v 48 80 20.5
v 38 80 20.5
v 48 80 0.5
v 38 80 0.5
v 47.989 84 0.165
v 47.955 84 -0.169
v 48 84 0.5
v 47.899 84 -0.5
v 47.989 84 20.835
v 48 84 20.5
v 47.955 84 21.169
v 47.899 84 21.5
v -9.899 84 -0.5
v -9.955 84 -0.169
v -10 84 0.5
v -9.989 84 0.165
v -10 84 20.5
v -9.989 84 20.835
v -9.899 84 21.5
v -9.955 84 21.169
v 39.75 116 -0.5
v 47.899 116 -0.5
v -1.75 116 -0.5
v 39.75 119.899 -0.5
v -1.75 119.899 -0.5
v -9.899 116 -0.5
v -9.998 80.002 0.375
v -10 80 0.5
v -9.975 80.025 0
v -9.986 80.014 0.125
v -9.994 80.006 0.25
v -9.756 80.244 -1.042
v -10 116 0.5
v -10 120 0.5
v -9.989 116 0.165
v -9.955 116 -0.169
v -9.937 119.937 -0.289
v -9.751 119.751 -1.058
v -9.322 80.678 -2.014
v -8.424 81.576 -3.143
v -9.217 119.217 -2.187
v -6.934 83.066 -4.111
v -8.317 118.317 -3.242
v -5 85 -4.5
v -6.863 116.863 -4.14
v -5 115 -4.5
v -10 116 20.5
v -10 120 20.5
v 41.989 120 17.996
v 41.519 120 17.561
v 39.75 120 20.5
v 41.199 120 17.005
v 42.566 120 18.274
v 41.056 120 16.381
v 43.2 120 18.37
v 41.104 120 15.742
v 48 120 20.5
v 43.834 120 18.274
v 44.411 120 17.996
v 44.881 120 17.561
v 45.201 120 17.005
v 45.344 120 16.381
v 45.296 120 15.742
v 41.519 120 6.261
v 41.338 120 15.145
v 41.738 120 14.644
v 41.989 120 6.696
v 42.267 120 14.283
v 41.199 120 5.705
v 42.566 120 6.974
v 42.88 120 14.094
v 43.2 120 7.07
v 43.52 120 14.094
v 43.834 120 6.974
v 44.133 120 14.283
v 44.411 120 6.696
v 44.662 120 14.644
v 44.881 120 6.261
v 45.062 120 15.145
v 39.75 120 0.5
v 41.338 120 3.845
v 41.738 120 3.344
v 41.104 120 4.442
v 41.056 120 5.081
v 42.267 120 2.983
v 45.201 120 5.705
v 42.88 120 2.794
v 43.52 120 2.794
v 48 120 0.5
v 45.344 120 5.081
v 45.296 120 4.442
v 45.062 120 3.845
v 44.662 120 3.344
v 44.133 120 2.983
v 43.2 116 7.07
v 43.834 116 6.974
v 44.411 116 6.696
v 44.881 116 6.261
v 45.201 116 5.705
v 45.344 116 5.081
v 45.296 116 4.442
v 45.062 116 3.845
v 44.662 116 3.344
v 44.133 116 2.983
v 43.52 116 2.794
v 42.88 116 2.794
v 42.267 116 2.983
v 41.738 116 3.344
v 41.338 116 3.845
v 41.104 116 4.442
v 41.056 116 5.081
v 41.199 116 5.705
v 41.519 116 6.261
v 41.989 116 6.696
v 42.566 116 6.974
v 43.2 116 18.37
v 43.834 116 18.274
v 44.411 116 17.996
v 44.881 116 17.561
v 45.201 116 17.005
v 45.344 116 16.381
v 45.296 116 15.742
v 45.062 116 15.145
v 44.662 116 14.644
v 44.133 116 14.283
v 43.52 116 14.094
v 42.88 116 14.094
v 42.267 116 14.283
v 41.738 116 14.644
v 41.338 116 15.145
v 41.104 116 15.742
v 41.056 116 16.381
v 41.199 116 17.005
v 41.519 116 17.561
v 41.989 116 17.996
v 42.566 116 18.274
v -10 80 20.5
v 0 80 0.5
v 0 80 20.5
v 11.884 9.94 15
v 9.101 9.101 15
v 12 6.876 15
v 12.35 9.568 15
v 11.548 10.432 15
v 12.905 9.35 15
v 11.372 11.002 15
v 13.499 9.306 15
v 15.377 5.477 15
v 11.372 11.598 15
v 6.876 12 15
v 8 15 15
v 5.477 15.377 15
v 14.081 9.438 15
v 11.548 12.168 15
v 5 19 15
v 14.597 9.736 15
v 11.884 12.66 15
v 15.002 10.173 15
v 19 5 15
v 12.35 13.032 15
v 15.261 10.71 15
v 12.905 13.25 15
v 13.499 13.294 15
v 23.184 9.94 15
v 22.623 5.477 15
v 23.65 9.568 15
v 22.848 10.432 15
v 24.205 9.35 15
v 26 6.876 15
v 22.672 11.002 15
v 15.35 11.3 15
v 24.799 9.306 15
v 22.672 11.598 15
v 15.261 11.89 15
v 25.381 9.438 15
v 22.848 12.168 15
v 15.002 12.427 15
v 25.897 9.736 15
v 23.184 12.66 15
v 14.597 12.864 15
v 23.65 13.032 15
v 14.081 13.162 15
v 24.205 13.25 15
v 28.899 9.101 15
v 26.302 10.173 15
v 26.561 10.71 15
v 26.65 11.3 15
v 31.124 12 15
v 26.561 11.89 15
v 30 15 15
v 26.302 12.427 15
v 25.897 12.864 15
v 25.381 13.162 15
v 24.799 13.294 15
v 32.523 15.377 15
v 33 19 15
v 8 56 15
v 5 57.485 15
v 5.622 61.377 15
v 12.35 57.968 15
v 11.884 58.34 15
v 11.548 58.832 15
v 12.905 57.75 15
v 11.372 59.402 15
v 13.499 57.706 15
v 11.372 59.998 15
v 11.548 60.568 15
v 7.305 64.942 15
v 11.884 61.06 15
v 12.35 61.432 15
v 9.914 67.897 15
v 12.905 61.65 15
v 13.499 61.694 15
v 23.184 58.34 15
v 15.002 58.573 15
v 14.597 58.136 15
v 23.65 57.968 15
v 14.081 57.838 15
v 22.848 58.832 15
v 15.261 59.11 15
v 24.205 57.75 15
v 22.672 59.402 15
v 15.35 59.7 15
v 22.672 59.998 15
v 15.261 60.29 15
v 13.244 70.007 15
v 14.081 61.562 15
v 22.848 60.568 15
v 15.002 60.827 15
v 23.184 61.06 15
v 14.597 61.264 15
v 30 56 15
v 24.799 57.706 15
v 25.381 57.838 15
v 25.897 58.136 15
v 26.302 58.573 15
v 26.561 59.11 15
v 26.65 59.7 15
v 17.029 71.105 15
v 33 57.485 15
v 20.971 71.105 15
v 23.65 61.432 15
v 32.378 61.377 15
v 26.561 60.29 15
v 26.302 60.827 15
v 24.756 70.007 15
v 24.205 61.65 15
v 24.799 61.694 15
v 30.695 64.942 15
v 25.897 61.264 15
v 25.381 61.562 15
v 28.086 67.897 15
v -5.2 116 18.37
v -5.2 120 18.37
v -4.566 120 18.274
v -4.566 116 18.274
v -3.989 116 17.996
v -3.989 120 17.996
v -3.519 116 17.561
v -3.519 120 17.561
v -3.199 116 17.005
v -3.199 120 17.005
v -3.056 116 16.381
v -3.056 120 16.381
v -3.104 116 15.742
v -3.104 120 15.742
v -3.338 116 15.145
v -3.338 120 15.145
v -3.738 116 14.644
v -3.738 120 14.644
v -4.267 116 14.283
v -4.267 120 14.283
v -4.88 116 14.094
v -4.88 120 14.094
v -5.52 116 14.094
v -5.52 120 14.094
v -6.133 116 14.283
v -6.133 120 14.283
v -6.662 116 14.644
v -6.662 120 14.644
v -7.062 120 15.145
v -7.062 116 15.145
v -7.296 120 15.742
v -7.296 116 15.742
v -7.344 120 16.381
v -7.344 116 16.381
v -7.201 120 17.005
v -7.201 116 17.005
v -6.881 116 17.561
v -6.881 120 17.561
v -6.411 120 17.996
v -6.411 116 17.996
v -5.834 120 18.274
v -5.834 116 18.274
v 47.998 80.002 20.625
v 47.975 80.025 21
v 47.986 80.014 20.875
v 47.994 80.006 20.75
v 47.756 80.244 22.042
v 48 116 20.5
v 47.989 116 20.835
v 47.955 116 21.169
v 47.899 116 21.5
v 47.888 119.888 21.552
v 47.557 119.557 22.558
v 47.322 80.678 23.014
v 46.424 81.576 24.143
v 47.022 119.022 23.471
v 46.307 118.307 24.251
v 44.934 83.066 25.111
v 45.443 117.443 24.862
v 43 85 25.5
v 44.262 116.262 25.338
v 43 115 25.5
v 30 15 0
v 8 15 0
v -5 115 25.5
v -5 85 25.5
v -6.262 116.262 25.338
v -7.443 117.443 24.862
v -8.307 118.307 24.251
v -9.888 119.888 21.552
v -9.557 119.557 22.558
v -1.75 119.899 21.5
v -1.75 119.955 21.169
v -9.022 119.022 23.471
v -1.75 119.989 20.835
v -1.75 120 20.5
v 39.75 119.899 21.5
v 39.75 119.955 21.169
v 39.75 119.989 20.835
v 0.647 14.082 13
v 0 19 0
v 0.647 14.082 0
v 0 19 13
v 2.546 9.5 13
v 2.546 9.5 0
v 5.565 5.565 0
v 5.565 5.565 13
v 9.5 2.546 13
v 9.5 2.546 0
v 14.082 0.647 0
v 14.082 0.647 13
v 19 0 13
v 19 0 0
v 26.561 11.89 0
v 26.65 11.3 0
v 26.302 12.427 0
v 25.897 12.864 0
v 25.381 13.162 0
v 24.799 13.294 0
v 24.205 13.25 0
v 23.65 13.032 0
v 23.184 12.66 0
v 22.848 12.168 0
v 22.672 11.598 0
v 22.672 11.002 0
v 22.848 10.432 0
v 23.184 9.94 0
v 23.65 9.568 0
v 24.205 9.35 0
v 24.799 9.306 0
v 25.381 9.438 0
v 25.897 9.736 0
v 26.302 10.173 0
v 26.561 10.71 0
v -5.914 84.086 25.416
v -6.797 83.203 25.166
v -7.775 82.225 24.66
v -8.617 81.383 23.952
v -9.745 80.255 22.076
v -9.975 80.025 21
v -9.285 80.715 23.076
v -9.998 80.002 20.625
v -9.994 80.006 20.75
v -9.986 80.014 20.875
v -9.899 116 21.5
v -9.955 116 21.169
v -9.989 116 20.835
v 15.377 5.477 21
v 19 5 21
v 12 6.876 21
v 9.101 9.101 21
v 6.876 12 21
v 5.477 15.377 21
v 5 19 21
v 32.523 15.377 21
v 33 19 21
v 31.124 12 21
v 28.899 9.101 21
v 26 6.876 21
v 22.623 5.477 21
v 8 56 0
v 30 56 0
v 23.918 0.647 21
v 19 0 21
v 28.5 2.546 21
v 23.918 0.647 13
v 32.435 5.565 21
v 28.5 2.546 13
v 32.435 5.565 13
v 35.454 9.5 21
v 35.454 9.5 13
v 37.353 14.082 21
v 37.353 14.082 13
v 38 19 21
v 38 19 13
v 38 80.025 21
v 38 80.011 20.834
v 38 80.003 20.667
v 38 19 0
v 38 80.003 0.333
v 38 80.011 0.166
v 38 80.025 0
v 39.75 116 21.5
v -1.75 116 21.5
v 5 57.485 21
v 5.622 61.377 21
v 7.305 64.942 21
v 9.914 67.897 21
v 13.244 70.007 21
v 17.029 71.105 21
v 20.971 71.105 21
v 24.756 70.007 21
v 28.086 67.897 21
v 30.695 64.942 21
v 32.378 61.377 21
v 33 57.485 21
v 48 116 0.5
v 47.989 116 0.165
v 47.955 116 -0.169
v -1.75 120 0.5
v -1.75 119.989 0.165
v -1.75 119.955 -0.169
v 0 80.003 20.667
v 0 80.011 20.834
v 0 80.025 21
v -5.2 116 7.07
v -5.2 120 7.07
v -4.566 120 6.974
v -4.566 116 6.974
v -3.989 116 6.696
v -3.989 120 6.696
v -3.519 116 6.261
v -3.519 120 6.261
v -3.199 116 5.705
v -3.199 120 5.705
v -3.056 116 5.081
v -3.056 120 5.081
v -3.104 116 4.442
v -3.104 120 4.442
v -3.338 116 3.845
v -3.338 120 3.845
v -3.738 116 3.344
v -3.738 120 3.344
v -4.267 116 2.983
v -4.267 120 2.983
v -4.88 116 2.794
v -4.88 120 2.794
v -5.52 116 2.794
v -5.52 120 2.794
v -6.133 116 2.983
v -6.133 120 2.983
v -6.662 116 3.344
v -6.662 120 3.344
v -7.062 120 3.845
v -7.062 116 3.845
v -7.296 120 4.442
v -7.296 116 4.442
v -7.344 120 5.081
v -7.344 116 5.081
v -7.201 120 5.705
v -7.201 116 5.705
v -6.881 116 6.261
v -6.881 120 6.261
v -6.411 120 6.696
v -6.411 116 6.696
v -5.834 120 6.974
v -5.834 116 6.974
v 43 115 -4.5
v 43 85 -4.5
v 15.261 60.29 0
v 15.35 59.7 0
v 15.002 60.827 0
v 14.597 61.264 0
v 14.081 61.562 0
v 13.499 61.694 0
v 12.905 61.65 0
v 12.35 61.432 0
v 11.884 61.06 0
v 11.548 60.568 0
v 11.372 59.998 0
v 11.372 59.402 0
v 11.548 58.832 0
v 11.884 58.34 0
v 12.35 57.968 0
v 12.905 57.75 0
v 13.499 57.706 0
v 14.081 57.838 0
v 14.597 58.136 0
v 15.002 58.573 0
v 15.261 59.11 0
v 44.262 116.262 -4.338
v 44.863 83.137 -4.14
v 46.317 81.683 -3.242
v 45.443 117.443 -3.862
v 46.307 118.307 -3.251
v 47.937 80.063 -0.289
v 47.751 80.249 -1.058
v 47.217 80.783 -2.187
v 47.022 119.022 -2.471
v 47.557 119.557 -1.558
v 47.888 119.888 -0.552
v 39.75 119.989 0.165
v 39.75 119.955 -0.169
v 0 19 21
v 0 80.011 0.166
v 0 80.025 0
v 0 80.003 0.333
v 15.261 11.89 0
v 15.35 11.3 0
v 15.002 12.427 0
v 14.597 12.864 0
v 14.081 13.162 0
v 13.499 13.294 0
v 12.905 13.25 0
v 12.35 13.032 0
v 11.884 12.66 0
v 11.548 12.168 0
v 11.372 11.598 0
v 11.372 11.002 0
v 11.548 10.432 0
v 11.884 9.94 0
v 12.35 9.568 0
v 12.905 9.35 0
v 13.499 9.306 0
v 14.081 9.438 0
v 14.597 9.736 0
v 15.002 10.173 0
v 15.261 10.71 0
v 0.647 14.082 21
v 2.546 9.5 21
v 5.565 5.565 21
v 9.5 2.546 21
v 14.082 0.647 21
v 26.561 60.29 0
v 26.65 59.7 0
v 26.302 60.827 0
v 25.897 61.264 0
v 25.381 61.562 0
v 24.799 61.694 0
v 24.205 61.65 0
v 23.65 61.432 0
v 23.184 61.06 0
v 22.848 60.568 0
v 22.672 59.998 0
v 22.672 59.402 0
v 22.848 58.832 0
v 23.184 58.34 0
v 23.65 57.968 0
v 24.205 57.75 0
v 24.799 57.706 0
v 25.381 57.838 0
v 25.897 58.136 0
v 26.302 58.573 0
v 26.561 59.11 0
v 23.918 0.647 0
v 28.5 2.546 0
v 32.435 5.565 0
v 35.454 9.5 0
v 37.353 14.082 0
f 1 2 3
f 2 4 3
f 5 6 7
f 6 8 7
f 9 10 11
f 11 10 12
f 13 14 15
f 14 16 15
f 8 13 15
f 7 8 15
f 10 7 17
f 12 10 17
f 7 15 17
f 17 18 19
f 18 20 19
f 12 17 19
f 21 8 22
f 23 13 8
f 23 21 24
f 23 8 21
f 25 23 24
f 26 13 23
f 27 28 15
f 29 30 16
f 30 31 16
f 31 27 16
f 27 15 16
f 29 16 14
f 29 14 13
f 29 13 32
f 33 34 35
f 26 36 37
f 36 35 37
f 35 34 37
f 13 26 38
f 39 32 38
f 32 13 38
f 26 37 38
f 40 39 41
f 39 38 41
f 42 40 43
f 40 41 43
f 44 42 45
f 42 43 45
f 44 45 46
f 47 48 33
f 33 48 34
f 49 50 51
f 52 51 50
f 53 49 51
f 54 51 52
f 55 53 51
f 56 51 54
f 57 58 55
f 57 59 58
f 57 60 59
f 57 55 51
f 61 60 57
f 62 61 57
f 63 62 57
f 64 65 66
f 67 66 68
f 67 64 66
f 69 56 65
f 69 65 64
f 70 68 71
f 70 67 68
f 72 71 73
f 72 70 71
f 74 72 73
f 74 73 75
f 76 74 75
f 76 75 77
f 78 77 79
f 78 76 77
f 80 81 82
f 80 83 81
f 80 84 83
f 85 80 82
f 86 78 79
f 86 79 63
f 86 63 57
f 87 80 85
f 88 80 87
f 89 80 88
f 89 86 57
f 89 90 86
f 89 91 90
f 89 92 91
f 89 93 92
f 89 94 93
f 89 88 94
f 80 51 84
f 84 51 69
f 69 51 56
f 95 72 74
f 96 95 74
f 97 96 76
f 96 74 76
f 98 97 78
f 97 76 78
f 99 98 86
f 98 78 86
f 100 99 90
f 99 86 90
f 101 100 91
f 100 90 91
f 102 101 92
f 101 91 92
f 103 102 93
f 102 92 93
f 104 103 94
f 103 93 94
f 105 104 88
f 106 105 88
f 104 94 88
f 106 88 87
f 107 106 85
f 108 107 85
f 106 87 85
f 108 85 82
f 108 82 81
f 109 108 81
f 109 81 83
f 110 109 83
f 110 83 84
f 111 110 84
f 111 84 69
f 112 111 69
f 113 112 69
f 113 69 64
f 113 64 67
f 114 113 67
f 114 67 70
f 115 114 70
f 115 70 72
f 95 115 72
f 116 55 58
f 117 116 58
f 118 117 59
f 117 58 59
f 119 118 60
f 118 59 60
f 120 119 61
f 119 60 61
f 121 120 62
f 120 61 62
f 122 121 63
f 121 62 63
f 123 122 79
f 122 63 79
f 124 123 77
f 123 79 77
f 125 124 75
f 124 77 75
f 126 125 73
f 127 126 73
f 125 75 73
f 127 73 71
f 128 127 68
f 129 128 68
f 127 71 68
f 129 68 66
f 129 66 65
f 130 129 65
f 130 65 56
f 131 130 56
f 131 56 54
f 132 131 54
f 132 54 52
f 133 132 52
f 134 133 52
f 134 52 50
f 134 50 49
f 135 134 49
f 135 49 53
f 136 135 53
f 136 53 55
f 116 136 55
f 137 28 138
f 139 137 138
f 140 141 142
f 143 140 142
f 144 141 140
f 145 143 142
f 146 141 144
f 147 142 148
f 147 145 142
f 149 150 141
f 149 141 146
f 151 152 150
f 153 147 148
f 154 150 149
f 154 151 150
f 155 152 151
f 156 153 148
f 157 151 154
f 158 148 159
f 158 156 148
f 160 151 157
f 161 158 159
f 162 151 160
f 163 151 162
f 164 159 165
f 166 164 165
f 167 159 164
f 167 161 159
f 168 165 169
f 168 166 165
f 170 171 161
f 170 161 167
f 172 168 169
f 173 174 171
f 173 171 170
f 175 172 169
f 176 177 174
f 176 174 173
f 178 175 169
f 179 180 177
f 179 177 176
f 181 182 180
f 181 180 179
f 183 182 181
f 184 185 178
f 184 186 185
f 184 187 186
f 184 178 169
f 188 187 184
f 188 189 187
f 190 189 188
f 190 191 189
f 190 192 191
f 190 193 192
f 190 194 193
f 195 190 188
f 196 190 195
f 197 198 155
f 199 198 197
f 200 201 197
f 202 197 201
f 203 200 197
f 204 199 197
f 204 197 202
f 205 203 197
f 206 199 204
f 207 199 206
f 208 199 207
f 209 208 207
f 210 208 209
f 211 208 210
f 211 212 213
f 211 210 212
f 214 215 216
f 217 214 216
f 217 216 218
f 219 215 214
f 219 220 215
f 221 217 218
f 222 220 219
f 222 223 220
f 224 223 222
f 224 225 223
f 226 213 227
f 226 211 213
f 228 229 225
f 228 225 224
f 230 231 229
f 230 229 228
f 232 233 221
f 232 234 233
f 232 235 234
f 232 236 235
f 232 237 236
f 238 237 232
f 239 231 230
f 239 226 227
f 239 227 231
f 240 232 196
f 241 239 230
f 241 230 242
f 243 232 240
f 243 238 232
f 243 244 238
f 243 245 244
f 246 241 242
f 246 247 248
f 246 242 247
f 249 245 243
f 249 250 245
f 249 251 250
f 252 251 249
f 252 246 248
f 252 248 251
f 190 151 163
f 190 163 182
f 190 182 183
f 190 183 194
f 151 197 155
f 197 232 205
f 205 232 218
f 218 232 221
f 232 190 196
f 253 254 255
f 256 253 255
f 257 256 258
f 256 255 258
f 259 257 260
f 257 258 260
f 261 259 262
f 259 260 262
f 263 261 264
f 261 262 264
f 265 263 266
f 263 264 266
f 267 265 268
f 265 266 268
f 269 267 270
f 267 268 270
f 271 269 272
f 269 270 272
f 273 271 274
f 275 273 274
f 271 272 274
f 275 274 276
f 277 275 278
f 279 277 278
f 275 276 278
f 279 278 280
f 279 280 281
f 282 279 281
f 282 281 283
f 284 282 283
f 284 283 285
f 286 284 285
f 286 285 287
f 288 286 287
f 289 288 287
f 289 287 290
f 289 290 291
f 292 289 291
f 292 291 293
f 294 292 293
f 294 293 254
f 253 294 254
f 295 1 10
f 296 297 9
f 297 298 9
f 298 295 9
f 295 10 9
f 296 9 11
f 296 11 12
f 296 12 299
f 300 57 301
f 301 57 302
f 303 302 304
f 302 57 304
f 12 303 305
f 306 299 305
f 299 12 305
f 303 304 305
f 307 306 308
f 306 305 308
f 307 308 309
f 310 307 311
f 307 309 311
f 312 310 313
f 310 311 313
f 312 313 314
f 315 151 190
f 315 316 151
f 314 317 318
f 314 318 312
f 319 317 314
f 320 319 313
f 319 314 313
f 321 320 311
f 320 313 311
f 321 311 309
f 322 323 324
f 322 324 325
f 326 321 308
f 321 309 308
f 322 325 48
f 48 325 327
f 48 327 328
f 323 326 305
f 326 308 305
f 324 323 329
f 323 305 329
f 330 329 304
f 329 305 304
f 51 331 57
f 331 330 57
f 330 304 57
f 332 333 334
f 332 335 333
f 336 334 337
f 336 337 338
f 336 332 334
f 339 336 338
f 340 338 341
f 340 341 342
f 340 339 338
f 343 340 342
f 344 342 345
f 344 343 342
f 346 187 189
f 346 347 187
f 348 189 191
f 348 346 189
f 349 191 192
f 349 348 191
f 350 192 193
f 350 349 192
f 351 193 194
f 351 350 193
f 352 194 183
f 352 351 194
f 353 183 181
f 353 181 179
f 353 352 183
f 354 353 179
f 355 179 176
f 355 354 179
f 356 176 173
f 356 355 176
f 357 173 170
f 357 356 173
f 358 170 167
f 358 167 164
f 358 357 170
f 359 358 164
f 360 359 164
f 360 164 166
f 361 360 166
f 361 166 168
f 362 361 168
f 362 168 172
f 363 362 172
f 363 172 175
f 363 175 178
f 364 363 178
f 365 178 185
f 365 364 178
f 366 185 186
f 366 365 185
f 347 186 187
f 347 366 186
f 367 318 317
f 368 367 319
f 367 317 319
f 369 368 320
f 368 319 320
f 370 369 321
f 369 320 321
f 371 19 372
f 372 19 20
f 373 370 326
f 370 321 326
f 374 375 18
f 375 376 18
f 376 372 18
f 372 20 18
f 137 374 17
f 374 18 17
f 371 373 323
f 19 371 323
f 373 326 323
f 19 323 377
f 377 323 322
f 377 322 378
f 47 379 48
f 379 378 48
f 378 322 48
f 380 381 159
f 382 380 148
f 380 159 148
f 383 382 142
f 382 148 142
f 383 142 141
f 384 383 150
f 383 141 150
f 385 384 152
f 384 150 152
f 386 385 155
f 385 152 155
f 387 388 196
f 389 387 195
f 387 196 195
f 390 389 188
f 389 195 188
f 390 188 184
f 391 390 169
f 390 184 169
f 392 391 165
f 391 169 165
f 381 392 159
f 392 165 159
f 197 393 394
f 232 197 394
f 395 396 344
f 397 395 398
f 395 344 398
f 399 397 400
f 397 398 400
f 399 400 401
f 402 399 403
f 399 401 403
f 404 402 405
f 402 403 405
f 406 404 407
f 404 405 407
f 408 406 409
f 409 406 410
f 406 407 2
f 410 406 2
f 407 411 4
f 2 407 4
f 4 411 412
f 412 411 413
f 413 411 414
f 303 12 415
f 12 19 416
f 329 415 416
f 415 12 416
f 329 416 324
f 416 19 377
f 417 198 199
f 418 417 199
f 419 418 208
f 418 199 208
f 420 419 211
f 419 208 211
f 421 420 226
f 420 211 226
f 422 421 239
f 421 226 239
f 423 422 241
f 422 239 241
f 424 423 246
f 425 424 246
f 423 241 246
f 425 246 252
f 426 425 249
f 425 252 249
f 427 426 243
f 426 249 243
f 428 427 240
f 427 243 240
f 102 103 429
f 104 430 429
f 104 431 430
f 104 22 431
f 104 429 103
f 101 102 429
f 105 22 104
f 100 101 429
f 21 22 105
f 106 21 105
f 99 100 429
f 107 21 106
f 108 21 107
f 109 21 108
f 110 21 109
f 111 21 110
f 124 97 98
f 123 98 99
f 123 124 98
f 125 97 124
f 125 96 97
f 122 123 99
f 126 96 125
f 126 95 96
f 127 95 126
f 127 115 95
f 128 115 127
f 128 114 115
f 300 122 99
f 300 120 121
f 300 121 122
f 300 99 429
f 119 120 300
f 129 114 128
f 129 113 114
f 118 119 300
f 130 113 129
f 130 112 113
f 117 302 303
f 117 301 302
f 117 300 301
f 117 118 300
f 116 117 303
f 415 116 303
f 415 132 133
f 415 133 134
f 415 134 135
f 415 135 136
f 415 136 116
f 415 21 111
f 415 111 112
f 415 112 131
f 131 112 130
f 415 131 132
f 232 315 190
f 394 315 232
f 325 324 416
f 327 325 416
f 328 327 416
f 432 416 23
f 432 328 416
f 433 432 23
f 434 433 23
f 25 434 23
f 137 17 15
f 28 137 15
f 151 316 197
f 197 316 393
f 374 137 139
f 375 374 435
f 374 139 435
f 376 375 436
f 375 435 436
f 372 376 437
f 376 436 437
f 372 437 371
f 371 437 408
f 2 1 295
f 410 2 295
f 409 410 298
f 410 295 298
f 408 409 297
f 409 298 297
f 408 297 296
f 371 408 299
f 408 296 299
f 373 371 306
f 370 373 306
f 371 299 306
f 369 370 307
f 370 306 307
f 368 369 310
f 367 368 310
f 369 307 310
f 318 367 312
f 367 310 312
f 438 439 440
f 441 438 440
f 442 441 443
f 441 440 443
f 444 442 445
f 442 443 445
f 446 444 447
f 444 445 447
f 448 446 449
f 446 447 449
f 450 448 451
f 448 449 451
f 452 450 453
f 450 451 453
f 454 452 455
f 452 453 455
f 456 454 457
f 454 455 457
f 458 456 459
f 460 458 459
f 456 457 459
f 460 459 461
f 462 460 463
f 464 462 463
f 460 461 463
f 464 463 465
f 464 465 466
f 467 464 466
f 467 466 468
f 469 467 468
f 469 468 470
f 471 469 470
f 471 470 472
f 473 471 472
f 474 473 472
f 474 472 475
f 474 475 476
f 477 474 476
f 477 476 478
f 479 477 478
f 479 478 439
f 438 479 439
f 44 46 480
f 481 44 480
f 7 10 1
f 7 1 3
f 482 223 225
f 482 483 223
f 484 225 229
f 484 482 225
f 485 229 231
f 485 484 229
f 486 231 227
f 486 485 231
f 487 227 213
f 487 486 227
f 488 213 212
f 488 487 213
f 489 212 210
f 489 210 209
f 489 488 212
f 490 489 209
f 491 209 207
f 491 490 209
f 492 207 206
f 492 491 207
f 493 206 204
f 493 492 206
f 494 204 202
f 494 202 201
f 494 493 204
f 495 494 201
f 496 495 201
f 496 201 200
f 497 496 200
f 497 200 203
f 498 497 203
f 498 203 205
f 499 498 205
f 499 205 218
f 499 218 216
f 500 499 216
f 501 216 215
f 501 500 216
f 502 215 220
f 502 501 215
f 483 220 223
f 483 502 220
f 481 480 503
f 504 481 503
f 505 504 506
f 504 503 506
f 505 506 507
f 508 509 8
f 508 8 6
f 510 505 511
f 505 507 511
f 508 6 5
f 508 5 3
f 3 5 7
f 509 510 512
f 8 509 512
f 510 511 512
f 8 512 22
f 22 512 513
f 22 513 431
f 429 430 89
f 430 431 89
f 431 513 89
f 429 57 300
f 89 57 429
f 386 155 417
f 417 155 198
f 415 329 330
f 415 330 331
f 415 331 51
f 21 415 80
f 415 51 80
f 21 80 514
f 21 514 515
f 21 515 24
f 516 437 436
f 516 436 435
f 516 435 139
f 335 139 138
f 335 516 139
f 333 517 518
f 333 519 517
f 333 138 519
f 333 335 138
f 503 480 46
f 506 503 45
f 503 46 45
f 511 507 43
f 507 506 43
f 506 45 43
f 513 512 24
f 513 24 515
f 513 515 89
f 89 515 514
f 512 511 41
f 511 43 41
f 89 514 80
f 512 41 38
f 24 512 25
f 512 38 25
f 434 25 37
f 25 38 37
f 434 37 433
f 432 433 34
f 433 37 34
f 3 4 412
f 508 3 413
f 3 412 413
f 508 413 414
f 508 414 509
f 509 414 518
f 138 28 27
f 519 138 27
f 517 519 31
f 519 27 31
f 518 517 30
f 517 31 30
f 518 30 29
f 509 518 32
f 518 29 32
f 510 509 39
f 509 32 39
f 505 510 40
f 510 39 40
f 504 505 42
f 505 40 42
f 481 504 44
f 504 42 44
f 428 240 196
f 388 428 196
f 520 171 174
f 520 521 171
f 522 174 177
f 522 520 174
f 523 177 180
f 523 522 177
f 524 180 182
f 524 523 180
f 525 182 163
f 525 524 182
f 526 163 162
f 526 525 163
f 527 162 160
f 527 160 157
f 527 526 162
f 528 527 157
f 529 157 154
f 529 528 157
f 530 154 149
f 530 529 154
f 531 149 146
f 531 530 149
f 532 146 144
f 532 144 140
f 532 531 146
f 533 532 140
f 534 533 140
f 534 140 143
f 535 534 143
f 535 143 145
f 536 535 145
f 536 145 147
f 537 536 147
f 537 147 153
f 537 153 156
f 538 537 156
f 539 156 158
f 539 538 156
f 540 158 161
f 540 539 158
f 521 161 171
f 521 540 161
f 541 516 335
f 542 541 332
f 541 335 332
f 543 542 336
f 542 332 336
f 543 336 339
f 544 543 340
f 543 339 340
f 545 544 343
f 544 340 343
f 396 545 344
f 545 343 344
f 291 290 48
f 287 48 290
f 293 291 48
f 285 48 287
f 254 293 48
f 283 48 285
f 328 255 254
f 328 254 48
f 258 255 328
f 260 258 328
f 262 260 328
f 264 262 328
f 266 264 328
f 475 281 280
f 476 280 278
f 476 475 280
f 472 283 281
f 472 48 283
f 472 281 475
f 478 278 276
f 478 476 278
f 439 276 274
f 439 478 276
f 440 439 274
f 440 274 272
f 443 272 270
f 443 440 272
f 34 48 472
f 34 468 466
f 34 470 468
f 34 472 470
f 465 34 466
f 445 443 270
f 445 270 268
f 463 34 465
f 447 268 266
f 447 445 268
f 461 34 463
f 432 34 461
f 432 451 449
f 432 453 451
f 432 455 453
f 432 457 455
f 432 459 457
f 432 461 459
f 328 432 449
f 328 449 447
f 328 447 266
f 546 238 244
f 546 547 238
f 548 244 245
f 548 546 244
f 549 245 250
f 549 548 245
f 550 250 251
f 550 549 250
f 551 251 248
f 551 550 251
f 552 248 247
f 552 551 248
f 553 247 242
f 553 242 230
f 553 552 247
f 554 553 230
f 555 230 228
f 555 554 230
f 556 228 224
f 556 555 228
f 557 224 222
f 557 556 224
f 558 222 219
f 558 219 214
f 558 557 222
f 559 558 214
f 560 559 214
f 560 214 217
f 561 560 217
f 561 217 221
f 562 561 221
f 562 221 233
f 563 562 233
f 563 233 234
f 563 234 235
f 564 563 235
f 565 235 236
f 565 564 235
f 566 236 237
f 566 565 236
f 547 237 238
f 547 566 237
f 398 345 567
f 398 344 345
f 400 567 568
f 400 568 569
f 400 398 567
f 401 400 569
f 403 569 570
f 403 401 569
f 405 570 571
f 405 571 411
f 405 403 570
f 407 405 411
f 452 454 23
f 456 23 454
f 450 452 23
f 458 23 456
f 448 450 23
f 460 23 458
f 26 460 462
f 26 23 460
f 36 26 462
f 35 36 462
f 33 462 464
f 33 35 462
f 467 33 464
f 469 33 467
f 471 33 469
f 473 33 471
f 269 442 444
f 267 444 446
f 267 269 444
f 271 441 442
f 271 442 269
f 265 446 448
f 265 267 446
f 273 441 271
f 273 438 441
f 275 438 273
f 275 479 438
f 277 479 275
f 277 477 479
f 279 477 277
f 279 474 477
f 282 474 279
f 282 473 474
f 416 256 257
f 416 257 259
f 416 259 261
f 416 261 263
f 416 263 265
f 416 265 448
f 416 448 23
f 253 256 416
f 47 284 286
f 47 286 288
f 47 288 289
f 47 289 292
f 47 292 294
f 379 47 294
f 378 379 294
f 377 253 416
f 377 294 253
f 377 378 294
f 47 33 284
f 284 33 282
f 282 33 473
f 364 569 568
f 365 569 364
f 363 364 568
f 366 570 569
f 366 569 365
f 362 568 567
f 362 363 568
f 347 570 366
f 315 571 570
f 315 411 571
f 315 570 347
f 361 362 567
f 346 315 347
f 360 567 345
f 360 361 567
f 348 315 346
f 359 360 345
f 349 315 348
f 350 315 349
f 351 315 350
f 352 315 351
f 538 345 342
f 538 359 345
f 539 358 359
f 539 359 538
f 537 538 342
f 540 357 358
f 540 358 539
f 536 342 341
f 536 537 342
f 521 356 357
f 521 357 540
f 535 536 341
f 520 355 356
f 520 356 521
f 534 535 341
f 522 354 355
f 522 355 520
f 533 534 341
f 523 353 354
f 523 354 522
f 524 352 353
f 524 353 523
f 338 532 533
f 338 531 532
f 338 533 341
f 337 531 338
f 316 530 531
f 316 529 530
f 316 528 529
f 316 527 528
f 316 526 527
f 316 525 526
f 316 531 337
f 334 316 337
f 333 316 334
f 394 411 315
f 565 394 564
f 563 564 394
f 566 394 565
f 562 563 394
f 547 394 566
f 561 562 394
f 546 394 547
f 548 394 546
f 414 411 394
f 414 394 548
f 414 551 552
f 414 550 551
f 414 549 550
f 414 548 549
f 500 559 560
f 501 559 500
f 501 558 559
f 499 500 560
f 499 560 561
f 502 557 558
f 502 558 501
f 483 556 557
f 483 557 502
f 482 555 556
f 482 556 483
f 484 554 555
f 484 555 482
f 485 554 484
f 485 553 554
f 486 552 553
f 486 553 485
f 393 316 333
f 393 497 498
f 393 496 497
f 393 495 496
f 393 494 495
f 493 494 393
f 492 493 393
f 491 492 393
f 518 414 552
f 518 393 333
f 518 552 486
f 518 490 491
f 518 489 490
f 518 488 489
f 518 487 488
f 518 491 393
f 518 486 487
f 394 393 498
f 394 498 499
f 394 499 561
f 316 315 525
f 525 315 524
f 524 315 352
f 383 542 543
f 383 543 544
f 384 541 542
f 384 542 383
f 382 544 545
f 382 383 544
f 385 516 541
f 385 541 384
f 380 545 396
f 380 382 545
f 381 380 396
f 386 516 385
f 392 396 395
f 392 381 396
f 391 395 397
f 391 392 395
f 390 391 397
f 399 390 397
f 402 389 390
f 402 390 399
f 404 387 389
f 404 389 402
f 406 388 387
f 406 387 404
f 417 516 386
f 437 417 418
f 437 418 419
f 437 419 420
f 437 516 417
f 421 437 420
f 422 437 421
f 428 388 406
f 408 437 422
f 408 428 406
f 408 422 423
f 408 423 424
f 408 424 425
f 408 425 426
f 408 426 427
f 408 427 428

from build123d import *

# Parameters (mm, degrees)
SKETCH1_W                = 38
SKETCH1_H                = 120
BOSS_EXTRUDE1_DEPTH      = 13
FILLET1_R                = 19
SKETCH2_W                = 28
SKETCH2_H                = 43
BOSS_EXTRUDE2_DEPTH      = 8
SKETCH4_W                = 58
SKETCH4_H                = 30
BOSS_EXTRUDE3_DEPTH      = 40
SKETCH4_2_W              = 41.5
SKETCH4_2_H              = 22
SKETCH4_2_W_2            = 38
SKETCH4_2_H_2            = 21
CUT_EXTRUDE2_DEPTH       = 35
CUT_EXTRUDE3_REACH       = 137.699
SKETCH5_W                = 22
SKETCH5_H                = 32
CUT_EXTRUDE4_REACH       = 133.736
SKETCH7_R                = 2.15
FILLET2_R                = 5
CUT_EXTRUDE5_START       = -8
CUT_EXTRUDE5_DEPTH       = 8
BOSS_EXTRUDE4_DEPTH      = 8
SKETCH9_W                = 22
SKETCH9_H                = 41
CUT_EXTRUDE20_DEPTH      = 131.859657649
CUT_EXTRUDE22_DEPTH      = 131.859657649
CUT_EXTRUDE22_DEPTH_BACK = 131.859657649
SKETCH11_R               = 2
SKETCH11_W               = 22
SKETCH11_H               = 41
SKETCH12_R               = 2
SKETCH12_W               = 22
SKETCH12_H               = 41
BOSS_EXTRUDE6_DEPTH      = 10


# Some blends are built 0.0001 mm under size
with BuildPart() as part:
    # Sketch1 → Boss-Extrude1 (new body)
    with BuildSketch(Plane.XY):
        with Locations((19, 60)):
            Rectangle(SKETCH1_W, SKETCH1_H)
    extrude(amount=BOSS_EXTRUDE1_DEPTH)

    # Fillet1
    fillet1_edges = [part.edges().sort_by_distance(p)[0] for p in [
        (38, 0, 6.5),
        (0, 0, 6.5),
    ]]
    fillet(fillet1_edges, radius=FILLET1_R - 0.0001)  # a hair under: the kernel refuses the full size

    # Sketch2 → Boss-Extrude2 (add)
    with BuildSketch(Plane.XY.offset(13)):
        with BuildLine():
            Line((33, 72), (33, 19))
            ThreePointArc((33, 19), (28.899494937, 9.100505063), (19, 5))
            ThreePointArc((19, 5), (9.100505063, 9.100505063), (5, 19))
            Line((5, 19), (5, 72))
            Line((5, 72), (0, 72))
            Line((0, 72), (0, 19))
            ThreePointArc((0, 19), (5.564971157, 5.564971157), (19, 0))
            ThreePointArc((19, 0), (32.435028843, 5.564971157), (38, 19))
            Line((38, 19), (38, 72))
            Line((38, 72), (33, 72))
        make_face()
        Polygon((33, 115), (33, 72), (38, 72), (38, 120), (0, 120), (0, 72), (5, 72), (5, 115), align=None)
        with Locations((19, 93.5)):
            Rectangle(SKETCH2_W, SKETCH2_H)
    extrude(amount=BOSS_EXTRUDE2_DEPTH)

    # Sketch4 → Boss-Extrude3 (add)
    with BuildSketch(Plane(origin=(0, 120, 0), x_dir=(1, 0, 0), z_dir=(0, 1, 0))):
        with Locations((19, -10.5)):
            Rectangle(SKETCH4_W, SKETCH4_H)
    extrude(amount=-BOSS_EXTRUDE3_DEPTH)

    # Sketch4<2> → Cut-Extrude2 (cut)
    # profile 1 of 2: a face of its own
    with BuildSketch(Plane(origin=(0, 120, 0), x_dir=(1, 0, 0), z_dir=(0, 1, 0))):
        with Locations((19, -10.5)):
            Rectangle(SKETCH4_2_W, SKETCH4_2_H)
        with Locations((19, -10.5)):
            Rectangle(SKETCH4_2_W_2, SKETCH4_2_H_2, mode=Mode.SUBTRACT)
    # profile 2 of 2: a face of its own
    with BuildSketch(Plane(origin=(0, 120, 0), x_dir=(1, 0, 0), z_dir=(0, 1, 0))):
        with Locations((19, -10.5)):
            Rectangle(SKETCH4_2_W_2, SKETCH4_2_H_2)
    extrude(amount=-CUT_EXTRUDE2_DEPTH, mode=Mode.SUBTRACT)

    # Sketch5 → Cut-Extrude3 (cut, up to next)
    with BuildSketch(Plane.ZY.offset(10), mode=Mode.PRIVATE) as cut_extrude3_sk1:
        with Locations((10.5, 100)):
            Rectangle(SKETCH5_W, SKETCH5_H)
    cut_extrude3_tool1 = extrude(cut_extrude3_sk1.sketch, amount=-CUT_EXTRUDE3_REACH, mode=Mode.PRIVATE) & part.part
    add(cut_extrude3_tool1.solids().sort_by_distance((-10, 100, 10.5))[0], mode=Mode.SUBTRACT)

    # Sketch7 → Cut-Extrude4 (cut, up to next)
    with BuildSketch(Plane(origin=(0, 120, 0), x_dir=(1, 0, 0), z_dir=(0, 1, 0)), mode=Mode.PRIVATE) as cut_extrude4_sk1:
        with Locations(Location((-5.2, -4.92, 0), (0, 0, 270))):
            Circle(SKETCH7_R)
    cut_extrude4_tool1 = extrude(cut_extrude4_sk1.sketch, amount=-CUT_EXTRUDE4_REACH, mode=Mode.PRIVATE) & part.part
    # Sketch7 → Cut-Extrude4 (cut, up to next)
    with BuildSketch(Plane(origin=(0, 120, 0), x_dir=(1, 0, 0), z_dir=(0, 1, 0)), mode=Mode.PRIVATE) as cut_extrude4_sk2:
        with Locations(Location((-5.2, -16.22, 0), (0, 0, 270))):
            Circle(SKETCH7_R)
    cut_extrude4_tool2 = extrude(cut_extrude4_sk2.sketch, amount=-CUT_EXTRUDE4_REACH, mode=Mode.PRIVATE) & part.part
    # Sketch7 → Cut-Extrude4 (cut, up to next)
    with BuildSketch(Plane(origin=(0, 120, 0), x_dir=(1, 0, 0), z_dir=(0, 1, 0)), mode=Mode.PRIVATE) as cut_extrude4_sk3:
        with Locations(Location((43.2, -4.92, 0), (0, 0, 270))):
            Circle(SKETCH7_R)
    cut_extrude4_tool3 = extrude(cut_extrude4_sk3.sketch, amount=-CUT_EXTRUDE4_REACH, mode=Mode.PRIVATE) & part.part
    # Sketch7 → Cut-Extrude4 (cut, up to next)
    with BuildSketch(Plane(origin=(0, 120, 0), x_dir=(1, 0, 0), z_dir=(0, 1, 0)), mode=Mode.PRIVATE) as cut_extrude4_sk4:
        with Locations(Location((43.2, -16.22, 0), (0, 0, 270))):
            Circle(SKETCH7_R)
    cut_extrude4_tool4 = extrude(cut_extrude4_sk4.sketch, amount=-CUT_EXTRUDE4_REACH, mode=Mode.PRIVATE) & part.part
    # Sketch7 → Cut-Extrude4 (cut, up to next)
    with BuildSketch(Plane(origin=(0, 120, 0), x_dir=(1, 0, 0), z_dir=(0, 1, 0)), mode=Mode.PRIVATE) as cut_extrude4_sk5:
        with Locations(Location((-5.2, -4.92, 0), (0, 0, 270))):
            Circle(SKETCH7_R)
    cut_extrude4_tool5 = extrude(cut_extrude4_sk5.sketch, amount=-CUT_EXTRUDE4_REACH, mode=Mode.PRIVATE) & part.part
    add(cut_extrude4_tool1.solids().sort_by_distance((-5.2, 120, 4.92))[0], mode=Mode.SUBTRACT)
    add(cut_extrude4_tool2.solids().sort_by_distance((-5.2, 120, 16.22))[0], mode=Mode.SUBTRACT)
    add(cut_extrude4_tool3.solids().sort_by_distance((43.2, 120, 4.92))[0], mode=Mode.SUBTRACT)
    add(cut_extrude4_tool4.solids().sort_by_distance((43.2, 120, 16.22))[0], mode=Mode.SUBTRACT)
    add(cut_extrude4_tool5.solids().sort_by_distance((-5.2, 120, 4.92))[0], mode=Mode.SUBTRACT)

    # Fillet2
    # the kernel refuses this fillet: 5 mm, written as the material it takes off along each edge
    with BuildSketch(Plane(origin=(-10, 132.5, -4.5), x_dir=(1, 0, 0), z_dir=(0, -1, 0)), Plane(origin=(-10, 132.5, 25.5), x_dir=(0, 0, -1), z_dir=(0, -1, 0))) as fillet2_piece_1:
        with BuildLine():
            CenterArc((FILLET2_R, FILLET2_R), FILLET2_R, 180, 90)
            Line((0, FILLET2_R), (0, 0))
            Line((0, 0), (FILLET2_R, 0))
        make_face()
    extrude(amount=65, mode=Mode.SUBTRACT)
    with BuildSketch(Plane(origin=(-22.5, 120, -4.5), x_dir=(0, -1, 0), z_dir=(1, 0, 0)), Plane(origin=(60.5, 120, 25.5), x_dir=(0, -1, 0), z_dir=(-1, 0, 0))) as fillet2_piece_2:
        with BuildLine():
            CenterArc((FILLET2_R, -FILLET2_R), FILLET2_R, 90, 90)
            Line((0, -FILLET2_R), (0, 0))
            Line((0, 0), (FILLET2_R, 0))
        make_face()
    extrude(amount=83, mode=Mode.SUBTRACT)
    with BuildSketch(Plane(origin=(-22.5, 80, -4.5), x_dir=(0, 0, 1), z_dir=(1, 0, 0))) as fillet2_piece_3_section:
        with BuildLine():
            CenterArc((FILLET2_R, -FILLET2_R), FILLET2_R, 90, 90)
            Line((0, -FILLET2_R), (0, 0))
            Line((0, 0), (FILLET2_R, 0))
        make_face()
    fillet2_piece_3 = extrude(amount=83, mode=Mode.PRIVATE)
    fillet2_piece_3 = split(fillet2_piece_3, bisect_by=Plane(origin=(-11.25, 79.954430424, 0), z_dir=(0, 0, 1)), keep=Keep.TOP, mode=Mode.PRIVATE)
    fillet2_piece_3 = split(fillet2_piece_3, bisect_by=Plane(origin=(0, 79.954430424, 0.240366423), z_dir=(-1, 0, 0)), keep=Keep.TOP, mode=Mode.PRIVATE)
    add(fillet2_piece_3, mode=Mode.SUBTRACT)
    with BuildSketch(Plane(origin=(-22.5, 80, -4.5), x_dir=(0, 0, 1), z_dir=(1, 0, 0))) as fillet2_piece_4_section:
        with BuildLine():
            CenterArc((FILLET2_R, -FILLET2_R), FILLET2_R, 90, 90)
            Line((0, -FILLET2_R), (0, 0))
            Line((0, 0), (FILLET2_R, 0))
        make_face()
    fillet2_piece_4 = extrude(amount=83, mode=Mode.PRIVATE)
    fillet2_piece_4 = split(fillet2_piece_4, bisect_by=Plane(origin=(-11.25, 81.142067703, 0), z_dir=(0, 0, -1)), keep=Keep.TOP, mode=Mode.PRIVATE)
    fillet2_piece_4 = split(fillet2_piece_4, bisect_by=Plane(origin=(0, 81.142067703, -3.398950084), z_dir=(-1, 0, 0)), keep=Keep.TOP, mode=Mode.PRIVATE)
    add(fillet2_piece_4, mode=Mode.SUBTRACT)
    with BuildSketch(Plane(origin=(-22.5, 80, -4.5), x_dir=(0, 0, 1), z_dir=(1, 0, 0))) as fillet2_piece_5_section:
        with BuildLine():
            CenterArc((FILLET2_R, -FILLET2_R), FILLET2_R, 90, 90)
            Line((0, -FILLET2_R), (0, 0))
            Line((0, 0), (FILLET2_R, 0))
        make_face()
    fillet2_piece_5 = extrude(amount=83, mode=Mode.PRIVATE)
    fillet2_piece_5 = split(fillet2_piece_5, bisect_by=Plane(origin=(19, 81.142067703, 0), z_dir=(0, 0, -1)), keep=Keep.TOP, mode=Mode.PRIVATE)
    fillet2_piece_5 = split(fillet2_piece_5, bisect_by=Plane(origin=(0, 81.142067703, -3.398950084), z_dir=(1, 0, 0)), keep=Keep.TOP, mode=Mode.PRIVATE)
    fillet2_piece_5 = split(fillet2_piece_5, bisect_by=Plane(origin=(38, 81.142067703, -3.398950084), z_dir=(-1, 0, 0)), keep=Keep.TOP, mode=Mode.PRIVATE)
    add(fillet2_piece_5, mode=Mode.SUBTRACT)
    with BuildSketch(Plane(origin=(-22.5, 80, -4.5), x_dir=(0, 0, 1), z_dir=(1, 0, 0))) as fillet2_piece_6_section:
        with BuildLine():
            CenterArc((FILLET2_R, -FILLET2_R), FILLET2_R, 90, 90)
            Line((0, -FILLET2_R), (0, 0))
            Line((0, 0), (FILLET2_R, 0))
        make_face()
    fillet2_piece_6 = extrude(amount=83, mode=Mode.PRIVATE)
    fillet2_piece_6 = split(fillet2_piece_6, bisect_by=Plane(origin=(49.25, 79.954430424, 0), z_dir=(0, 0, 1)), keep=Keep.TOP, mode=Mode.PRIVATE)
    fillet2_piece_6 = split(fillet2_piece_6, bisect_by=Plane(origin=(38, 79.954430424, 0.240366423), z_dir=(1, 0, 0)), keep=Keep.TOP, mode=Mode.PRIVATE)
    add(fillet2_piece_6, mode=Mode.SUBTRACT)
    with BuildSketch(Plane(origin=(-22.5, 80, -4.5), x_dir=(0, 0, 1), z_dir=(1, 0, 0))) as fillet2_piece_7_section:
        with BuildLine():
            CenterArc((FILLET2_R, -FILLET2_R), FILLET2_R, 90, 90)
            Line((0, -FILLET2_R), (0, 0))
            Line((0, 0), (FILLET2_R, 0))
        make_face()
    fillet2_piece_7 = extrude(amount=83, mode=Mode.PRIVATE)
    fillet2_piece_7 = split(fillet2_piece_7, bisect_by=Plane(origin=(49.25, 81.142067703, 0), z_dir=(0, 0, -1)), keep=Keep.TOP, mode=Mode.PRIVATE)
    fillet2_piece_7 = split(fillet2_piece_7, bisect_by=Plane(origin=(38, 81.142067703, -3.398950084), z_dir=(1, 0, 0)), keep=Keep.TOP, mode=Mode.PRIVATE)
    add(fillet2_piece_7, mode=Mode.SUBTRACT)
    with BuildSketch(Plane(origin=(48, 132.5, -4.5), x_dir=(-1, 0, 0), z_dir=(0, -1, 0)), Plane(origin=(48, 132.5, 25.5), x_dir=(0, 0, -1), z_dir=(0, -1, 0))) as fillet2_piece_8:
        with BuildLine():
            CenterArc((FILLET2_R, -FILLET2_R), FILLET2_R, 90, 90)
            Line((0, -FILLET2_R), (0, 0))
            Line((0, 0), (FILLET2_R, 0))
        make_face()
    extrude(amount=65, mode=Mode.SUBTRACT)
    with BuildSketch(Plane(origin=(60.5, 80, 25.5), x_dir=(0, 0, -1), z_dir=(-1, 0, 0))) as fillet2_piece_9_section:
        with BuildLine():
            CenterArc((FILLET2_R, -FILLET2_R), FILLET2_R, 90, 90)
            Line((0, -FILLET2_R), (0, 0))
            Line((0, 0), (FILLET2_R, 0))
        make_face()
    fillet2_piece_9 = extrude(amount=83, mode=Mode.PRIVATE)
    fillet2_piece_9 = split(fillet2_piece_9, bisect_by=Plane(origin=(38, 79.954430424, 20.759633577), z_dir=(1, 0, 0)), keep=Keep.TOP, mode=Mode.PRIVATE)
    fillet2_piece_9 = split(fillet2_piece_9, bisect_by=Plane(origin=(49.25, 79.954430424, 21), z_dir=(0, 0, -1)), keep=Keep.TOP, mode=Mode.PRIVATE)
    add(fillet2_piece_9, mode=Mode.SUBTRACT)
    with BuildSketch(Plane(origin=(60.5, 80, 25.5), x_dir=(0, 0, -1), z_dir=(-1, 0, 0))) as fillet2_piece_10_section:
        with BuildLine():
            CenterArc((FILLET2_R, -FILLET2_R), FILLET2_R, 90, 90)
            Line((0, -FILLET2_R), (0, 0))
            Line((0, 0), (FILLET2_R, 0))
        make_face()
    fillet2_piece_10 = extrude(amount=83, mode=Mode.PRIVATE)
    fillet2_piece_10 = split(fillet2_piece_10, bisect_by=Plane(origin=(38, 81.142067703, 24.398950084), z_dir=(1, 0, 0)), keep=Keep.TOP, mode=Mode.PRIVATE)
    fillet2_piece_10 = split(fillet2_piece_10, bisect_by=Plane(origin=(49.25, 81.142067703, 21), z_dir=(0, 0, 1)), keep=Keep.TOP, mode=Mode.PRIVATE)
    add(fillet2_piece_10, mode=Mode.SUBTRACT)
    with BuildSketch(Plane(origin=(60.5, 80, 25.5), x_dir=(0, 0, -1), z_dir=(-1, 0, 0))) as fillet2_piece_11_section:
        with BuildLine():
            CenterArc((FILLET2_R, -FILLET2_R), FILLET2_R, 90, 90)
            Line((0, -FILLET2_R), (0, 0))
            Line((0, 0), (FILLET2_R, 0))
        make_face()
    fillet2_piece_11 = extrude(amount=83, mode=Mode.PRIVATE)
    fillet2_piece_11 = split(fillet2_piece_11, bisect_by=Plane(origin=(0, 81.142067703, 24.398950084), z_dir=(1, 0, 0)), keep=Keep.TOP, mode=Mode.PRIVATE)
    fillet2_piece_11 = split(fillet2_piece_11, bisect_by=Plane(origin=(38, 81.142067703, 24.398950084), z_dir=(-1, 0, 0)), keep=Keep.TOP, mode=Mode.PRIVATE)
    fillet2_piece_11 = split(fillet2_piece_11, bisect_by=Plane(origin=(19, 81.142067703, 21), z_dir=(0, 0, 1)), keep=Keep.TOP, mode=Mode.PRIVATE)
    add(fillet2_piece_11, mode=Mode.SUBTRACT)
    with BuildSketch(Plane(origin=(60.5, 80, 25.5), x_dir=(0, 0, -1), z_dir=(-1, 0, 0))) as fillet2_piece_12_section:
        with BuildLine():
            CenterArc((FILLET2_R, -FILLET2_R), FILLET2_R, 90, 90)
            Line((0, -FILLET2_R), (0, 0))
            Line((0, 0), (FILLET2_R, 0))
        make_face()
    fillet2_piece_12 = extrude(amount=83, mode=Mode.PRIVATE)
    fillet2_piece_12 = split(fillet2_piece_12, bisect_by=Plane(origin=(0, 79.954430424, 20.759633577), z_dir=(-1, 0, 0)), keep=Keep.TOP, mode=Mode.PRIVATE)
    fillet2_piece_12 = split(fillet2_piece_12, bisect_by=Plane(origin=(-11.25, 79.954430424, 21), z_dir=(0, 0, -1)), keep=Keep.TOP, mode=Mode.PRIVATE)
    add(fillet2_piece_12, mode=Mode.SUBTRACT)
    with BuildSketch(Plane(origin=(60.5, 80, 25.5), x_dir=(0, 0, -1), z_dir=(-1, 0, 0))) as fillet2_piece_13_section:
        with BuildLine():
            CenterArc((FILLET2_R, -FILLET2_R), FILLET2_R, 90, 90)
            Line((0, -FILLET2_R), (0, 0))
            Line((0, 0), (FILLET2_R, 0))
        make_face()
    fillet2_piece_13 = extrude(amount=83, mode=Mode.PRIVATE)
    fillet2_piece_13 = split(fillet2_piece_13, bisect_by=Plane(origin=(0, 81.142067703, 24.398950084), z_dir=(-1, 0, 0)), keep=Keep.TOP, mode=Mode.PRIVATE)
    fillet2_piece_13 = split(fillet2_piece_13, bisect_by=Plane(origin=(-11.25, 81.142067703, 21), z_dir=(0, 0, 1)), keep=Keep.TOP, mode=Mode.PRIVATE)
    add(fillet2_piece_13, mode=Mode.SUBTRACT)

    # Sketch3<3> → Cut-Extrude5 (cut)
    with BuildSketch(Plane.XY.offset(13).offset(CUT_EXTRUDE5_START)):
        with BuildLine():
            Line((5, 57.485100075), (5, 57))
            Line((5, 57), (5, 19))
            ThreePointArc((5, 19), (19, 5), (33, 19))
            Line((33, 19), (33, 57))
            Line((33, 57), (33, 57.485100075))
            ThreePointArc((33, 57.485100075), (19, 71.24465097), (5, 57.485100075))
        make_face()
    extrude(amount=CUT_EXTRUDE5_DEPTH, mode=Mode.SUBTRACT)

    # Sketch3 → Boss-Extrude4 (add)
    with BuildSketch(Plane.XY.offset(13)):
        with BuildLine():
            Line((5, 72), (5, 57.485100075))
            ThreePointArc((5, 57.485100075), (19, 71.24465097), (33, 57.485100075))
            Line((33, 57.485100075), (33, 72))
            Line((33, 72), (5, 72))
        make_face()
    extrude(amount=BOSS_EXTRUDE4_DEPTH)

    # Sketch9 → Cut-Extrude20 (cut, through all)
    with BuildSketch(Plane.XY.offset(5)):
        with Locations((19, 35.5)):
            Rectangle(SKETCH9_W, SKETCH9_H)
        with BuildLine():
            Line((11.609906409, 27.348861392), (11.609906409, 26.503403734))
            ThreePointArc((11.609906409, 26.503403734), (13.879652291, 15.001207086), (16.608900022, 26.403113985))
            Line((16.608900022, 26.403113985), (16.608900022, 27.248571642))
            ThreePointArc((16.608900022, 27.248571642), (14.159570107, 29.799310765), (11.609906409, 27.348861392))
        make_face(mode=Mode.SUBTRACT)
    extrude(amount=-CUT_EXTRUDE20_DEPTH, mode=Mode.SUBTRACT)


with BuildPart() as cut_extrude20_kept_piece:
    # of the separate pieces the step leaves, the one the design keeps (cut_extrude20_pieces_kept)
    add(part.part.solids().sort_by_distance((18.9999, 0, 0))[0])

    # Sketch11 → Cut-Extrude22 (cut, two sides: drawn at the far end of the back side and taken through both)
    with BuildSketch(Plane.XY.offset(5).offset(-CUT_EXTRUDE22_DEPTH_BACK)):
        with Locations((13.35, 59.7)):
            Circle(SKETCH11_R)
        with Locations((24.65, 59.7)):
            Circle(SKETCH11_R)
        with Locations((24.65, 11.3)):
            Circle(SKETCH11_R)
        with Locations((13.35, 11.3)):
            Circle(SKETCH11_R)
        with Locations((19, 35.5)):
            Rectangle(SKETCH11_W, SKETCH11_H)
    extrude(amount=CUT_EXTRUDE22_DEPTH + CUT_EXTRUDE22_DEPTH_BACK, mode=Mode.SUBTRACT)

    # Sketch12 → Boss-Extrude6 (add)
    with BuildSketch(Plane.XY.offset(5)):
        with BuildLine():
            Line((33, 19), (33, 57.485100075))
            ThreePointArc((33, 57.485100075), (19, 71.24465097), (5, 57.485100075))
            Line((5, 57.485100075), (5, 19))
            ThreePointArc((5, 19), (19, 5), (33, 19))
        make_face()
        with Locations((24.65, 11.3)):
            Circle(SKETCH12_R, mode=Mode.SUBTRACT)
        with Locations((13.35, 11.3)):
            Circle(SKETCH12_R, mode=Mode.SUBTRACT)
        with Locations((13.35, 59.7)):
            Circle(SKETCH12_R, mode=Mode.SUBTRACT)
        with Locations((24.65, 59.7)):
            Circle(SKETCH12_R, mode=Mode.SUBTRACT)
        with Locations((19, 35.5)):
            Rectangle(SKETCH12_W, SKETCH12_H, mode=Mode.SUBTRACT)
    extrude(amount=BOSS_EXTRUDE6_DEPTH)


solid = cut_extrude20_kept_piece.part
